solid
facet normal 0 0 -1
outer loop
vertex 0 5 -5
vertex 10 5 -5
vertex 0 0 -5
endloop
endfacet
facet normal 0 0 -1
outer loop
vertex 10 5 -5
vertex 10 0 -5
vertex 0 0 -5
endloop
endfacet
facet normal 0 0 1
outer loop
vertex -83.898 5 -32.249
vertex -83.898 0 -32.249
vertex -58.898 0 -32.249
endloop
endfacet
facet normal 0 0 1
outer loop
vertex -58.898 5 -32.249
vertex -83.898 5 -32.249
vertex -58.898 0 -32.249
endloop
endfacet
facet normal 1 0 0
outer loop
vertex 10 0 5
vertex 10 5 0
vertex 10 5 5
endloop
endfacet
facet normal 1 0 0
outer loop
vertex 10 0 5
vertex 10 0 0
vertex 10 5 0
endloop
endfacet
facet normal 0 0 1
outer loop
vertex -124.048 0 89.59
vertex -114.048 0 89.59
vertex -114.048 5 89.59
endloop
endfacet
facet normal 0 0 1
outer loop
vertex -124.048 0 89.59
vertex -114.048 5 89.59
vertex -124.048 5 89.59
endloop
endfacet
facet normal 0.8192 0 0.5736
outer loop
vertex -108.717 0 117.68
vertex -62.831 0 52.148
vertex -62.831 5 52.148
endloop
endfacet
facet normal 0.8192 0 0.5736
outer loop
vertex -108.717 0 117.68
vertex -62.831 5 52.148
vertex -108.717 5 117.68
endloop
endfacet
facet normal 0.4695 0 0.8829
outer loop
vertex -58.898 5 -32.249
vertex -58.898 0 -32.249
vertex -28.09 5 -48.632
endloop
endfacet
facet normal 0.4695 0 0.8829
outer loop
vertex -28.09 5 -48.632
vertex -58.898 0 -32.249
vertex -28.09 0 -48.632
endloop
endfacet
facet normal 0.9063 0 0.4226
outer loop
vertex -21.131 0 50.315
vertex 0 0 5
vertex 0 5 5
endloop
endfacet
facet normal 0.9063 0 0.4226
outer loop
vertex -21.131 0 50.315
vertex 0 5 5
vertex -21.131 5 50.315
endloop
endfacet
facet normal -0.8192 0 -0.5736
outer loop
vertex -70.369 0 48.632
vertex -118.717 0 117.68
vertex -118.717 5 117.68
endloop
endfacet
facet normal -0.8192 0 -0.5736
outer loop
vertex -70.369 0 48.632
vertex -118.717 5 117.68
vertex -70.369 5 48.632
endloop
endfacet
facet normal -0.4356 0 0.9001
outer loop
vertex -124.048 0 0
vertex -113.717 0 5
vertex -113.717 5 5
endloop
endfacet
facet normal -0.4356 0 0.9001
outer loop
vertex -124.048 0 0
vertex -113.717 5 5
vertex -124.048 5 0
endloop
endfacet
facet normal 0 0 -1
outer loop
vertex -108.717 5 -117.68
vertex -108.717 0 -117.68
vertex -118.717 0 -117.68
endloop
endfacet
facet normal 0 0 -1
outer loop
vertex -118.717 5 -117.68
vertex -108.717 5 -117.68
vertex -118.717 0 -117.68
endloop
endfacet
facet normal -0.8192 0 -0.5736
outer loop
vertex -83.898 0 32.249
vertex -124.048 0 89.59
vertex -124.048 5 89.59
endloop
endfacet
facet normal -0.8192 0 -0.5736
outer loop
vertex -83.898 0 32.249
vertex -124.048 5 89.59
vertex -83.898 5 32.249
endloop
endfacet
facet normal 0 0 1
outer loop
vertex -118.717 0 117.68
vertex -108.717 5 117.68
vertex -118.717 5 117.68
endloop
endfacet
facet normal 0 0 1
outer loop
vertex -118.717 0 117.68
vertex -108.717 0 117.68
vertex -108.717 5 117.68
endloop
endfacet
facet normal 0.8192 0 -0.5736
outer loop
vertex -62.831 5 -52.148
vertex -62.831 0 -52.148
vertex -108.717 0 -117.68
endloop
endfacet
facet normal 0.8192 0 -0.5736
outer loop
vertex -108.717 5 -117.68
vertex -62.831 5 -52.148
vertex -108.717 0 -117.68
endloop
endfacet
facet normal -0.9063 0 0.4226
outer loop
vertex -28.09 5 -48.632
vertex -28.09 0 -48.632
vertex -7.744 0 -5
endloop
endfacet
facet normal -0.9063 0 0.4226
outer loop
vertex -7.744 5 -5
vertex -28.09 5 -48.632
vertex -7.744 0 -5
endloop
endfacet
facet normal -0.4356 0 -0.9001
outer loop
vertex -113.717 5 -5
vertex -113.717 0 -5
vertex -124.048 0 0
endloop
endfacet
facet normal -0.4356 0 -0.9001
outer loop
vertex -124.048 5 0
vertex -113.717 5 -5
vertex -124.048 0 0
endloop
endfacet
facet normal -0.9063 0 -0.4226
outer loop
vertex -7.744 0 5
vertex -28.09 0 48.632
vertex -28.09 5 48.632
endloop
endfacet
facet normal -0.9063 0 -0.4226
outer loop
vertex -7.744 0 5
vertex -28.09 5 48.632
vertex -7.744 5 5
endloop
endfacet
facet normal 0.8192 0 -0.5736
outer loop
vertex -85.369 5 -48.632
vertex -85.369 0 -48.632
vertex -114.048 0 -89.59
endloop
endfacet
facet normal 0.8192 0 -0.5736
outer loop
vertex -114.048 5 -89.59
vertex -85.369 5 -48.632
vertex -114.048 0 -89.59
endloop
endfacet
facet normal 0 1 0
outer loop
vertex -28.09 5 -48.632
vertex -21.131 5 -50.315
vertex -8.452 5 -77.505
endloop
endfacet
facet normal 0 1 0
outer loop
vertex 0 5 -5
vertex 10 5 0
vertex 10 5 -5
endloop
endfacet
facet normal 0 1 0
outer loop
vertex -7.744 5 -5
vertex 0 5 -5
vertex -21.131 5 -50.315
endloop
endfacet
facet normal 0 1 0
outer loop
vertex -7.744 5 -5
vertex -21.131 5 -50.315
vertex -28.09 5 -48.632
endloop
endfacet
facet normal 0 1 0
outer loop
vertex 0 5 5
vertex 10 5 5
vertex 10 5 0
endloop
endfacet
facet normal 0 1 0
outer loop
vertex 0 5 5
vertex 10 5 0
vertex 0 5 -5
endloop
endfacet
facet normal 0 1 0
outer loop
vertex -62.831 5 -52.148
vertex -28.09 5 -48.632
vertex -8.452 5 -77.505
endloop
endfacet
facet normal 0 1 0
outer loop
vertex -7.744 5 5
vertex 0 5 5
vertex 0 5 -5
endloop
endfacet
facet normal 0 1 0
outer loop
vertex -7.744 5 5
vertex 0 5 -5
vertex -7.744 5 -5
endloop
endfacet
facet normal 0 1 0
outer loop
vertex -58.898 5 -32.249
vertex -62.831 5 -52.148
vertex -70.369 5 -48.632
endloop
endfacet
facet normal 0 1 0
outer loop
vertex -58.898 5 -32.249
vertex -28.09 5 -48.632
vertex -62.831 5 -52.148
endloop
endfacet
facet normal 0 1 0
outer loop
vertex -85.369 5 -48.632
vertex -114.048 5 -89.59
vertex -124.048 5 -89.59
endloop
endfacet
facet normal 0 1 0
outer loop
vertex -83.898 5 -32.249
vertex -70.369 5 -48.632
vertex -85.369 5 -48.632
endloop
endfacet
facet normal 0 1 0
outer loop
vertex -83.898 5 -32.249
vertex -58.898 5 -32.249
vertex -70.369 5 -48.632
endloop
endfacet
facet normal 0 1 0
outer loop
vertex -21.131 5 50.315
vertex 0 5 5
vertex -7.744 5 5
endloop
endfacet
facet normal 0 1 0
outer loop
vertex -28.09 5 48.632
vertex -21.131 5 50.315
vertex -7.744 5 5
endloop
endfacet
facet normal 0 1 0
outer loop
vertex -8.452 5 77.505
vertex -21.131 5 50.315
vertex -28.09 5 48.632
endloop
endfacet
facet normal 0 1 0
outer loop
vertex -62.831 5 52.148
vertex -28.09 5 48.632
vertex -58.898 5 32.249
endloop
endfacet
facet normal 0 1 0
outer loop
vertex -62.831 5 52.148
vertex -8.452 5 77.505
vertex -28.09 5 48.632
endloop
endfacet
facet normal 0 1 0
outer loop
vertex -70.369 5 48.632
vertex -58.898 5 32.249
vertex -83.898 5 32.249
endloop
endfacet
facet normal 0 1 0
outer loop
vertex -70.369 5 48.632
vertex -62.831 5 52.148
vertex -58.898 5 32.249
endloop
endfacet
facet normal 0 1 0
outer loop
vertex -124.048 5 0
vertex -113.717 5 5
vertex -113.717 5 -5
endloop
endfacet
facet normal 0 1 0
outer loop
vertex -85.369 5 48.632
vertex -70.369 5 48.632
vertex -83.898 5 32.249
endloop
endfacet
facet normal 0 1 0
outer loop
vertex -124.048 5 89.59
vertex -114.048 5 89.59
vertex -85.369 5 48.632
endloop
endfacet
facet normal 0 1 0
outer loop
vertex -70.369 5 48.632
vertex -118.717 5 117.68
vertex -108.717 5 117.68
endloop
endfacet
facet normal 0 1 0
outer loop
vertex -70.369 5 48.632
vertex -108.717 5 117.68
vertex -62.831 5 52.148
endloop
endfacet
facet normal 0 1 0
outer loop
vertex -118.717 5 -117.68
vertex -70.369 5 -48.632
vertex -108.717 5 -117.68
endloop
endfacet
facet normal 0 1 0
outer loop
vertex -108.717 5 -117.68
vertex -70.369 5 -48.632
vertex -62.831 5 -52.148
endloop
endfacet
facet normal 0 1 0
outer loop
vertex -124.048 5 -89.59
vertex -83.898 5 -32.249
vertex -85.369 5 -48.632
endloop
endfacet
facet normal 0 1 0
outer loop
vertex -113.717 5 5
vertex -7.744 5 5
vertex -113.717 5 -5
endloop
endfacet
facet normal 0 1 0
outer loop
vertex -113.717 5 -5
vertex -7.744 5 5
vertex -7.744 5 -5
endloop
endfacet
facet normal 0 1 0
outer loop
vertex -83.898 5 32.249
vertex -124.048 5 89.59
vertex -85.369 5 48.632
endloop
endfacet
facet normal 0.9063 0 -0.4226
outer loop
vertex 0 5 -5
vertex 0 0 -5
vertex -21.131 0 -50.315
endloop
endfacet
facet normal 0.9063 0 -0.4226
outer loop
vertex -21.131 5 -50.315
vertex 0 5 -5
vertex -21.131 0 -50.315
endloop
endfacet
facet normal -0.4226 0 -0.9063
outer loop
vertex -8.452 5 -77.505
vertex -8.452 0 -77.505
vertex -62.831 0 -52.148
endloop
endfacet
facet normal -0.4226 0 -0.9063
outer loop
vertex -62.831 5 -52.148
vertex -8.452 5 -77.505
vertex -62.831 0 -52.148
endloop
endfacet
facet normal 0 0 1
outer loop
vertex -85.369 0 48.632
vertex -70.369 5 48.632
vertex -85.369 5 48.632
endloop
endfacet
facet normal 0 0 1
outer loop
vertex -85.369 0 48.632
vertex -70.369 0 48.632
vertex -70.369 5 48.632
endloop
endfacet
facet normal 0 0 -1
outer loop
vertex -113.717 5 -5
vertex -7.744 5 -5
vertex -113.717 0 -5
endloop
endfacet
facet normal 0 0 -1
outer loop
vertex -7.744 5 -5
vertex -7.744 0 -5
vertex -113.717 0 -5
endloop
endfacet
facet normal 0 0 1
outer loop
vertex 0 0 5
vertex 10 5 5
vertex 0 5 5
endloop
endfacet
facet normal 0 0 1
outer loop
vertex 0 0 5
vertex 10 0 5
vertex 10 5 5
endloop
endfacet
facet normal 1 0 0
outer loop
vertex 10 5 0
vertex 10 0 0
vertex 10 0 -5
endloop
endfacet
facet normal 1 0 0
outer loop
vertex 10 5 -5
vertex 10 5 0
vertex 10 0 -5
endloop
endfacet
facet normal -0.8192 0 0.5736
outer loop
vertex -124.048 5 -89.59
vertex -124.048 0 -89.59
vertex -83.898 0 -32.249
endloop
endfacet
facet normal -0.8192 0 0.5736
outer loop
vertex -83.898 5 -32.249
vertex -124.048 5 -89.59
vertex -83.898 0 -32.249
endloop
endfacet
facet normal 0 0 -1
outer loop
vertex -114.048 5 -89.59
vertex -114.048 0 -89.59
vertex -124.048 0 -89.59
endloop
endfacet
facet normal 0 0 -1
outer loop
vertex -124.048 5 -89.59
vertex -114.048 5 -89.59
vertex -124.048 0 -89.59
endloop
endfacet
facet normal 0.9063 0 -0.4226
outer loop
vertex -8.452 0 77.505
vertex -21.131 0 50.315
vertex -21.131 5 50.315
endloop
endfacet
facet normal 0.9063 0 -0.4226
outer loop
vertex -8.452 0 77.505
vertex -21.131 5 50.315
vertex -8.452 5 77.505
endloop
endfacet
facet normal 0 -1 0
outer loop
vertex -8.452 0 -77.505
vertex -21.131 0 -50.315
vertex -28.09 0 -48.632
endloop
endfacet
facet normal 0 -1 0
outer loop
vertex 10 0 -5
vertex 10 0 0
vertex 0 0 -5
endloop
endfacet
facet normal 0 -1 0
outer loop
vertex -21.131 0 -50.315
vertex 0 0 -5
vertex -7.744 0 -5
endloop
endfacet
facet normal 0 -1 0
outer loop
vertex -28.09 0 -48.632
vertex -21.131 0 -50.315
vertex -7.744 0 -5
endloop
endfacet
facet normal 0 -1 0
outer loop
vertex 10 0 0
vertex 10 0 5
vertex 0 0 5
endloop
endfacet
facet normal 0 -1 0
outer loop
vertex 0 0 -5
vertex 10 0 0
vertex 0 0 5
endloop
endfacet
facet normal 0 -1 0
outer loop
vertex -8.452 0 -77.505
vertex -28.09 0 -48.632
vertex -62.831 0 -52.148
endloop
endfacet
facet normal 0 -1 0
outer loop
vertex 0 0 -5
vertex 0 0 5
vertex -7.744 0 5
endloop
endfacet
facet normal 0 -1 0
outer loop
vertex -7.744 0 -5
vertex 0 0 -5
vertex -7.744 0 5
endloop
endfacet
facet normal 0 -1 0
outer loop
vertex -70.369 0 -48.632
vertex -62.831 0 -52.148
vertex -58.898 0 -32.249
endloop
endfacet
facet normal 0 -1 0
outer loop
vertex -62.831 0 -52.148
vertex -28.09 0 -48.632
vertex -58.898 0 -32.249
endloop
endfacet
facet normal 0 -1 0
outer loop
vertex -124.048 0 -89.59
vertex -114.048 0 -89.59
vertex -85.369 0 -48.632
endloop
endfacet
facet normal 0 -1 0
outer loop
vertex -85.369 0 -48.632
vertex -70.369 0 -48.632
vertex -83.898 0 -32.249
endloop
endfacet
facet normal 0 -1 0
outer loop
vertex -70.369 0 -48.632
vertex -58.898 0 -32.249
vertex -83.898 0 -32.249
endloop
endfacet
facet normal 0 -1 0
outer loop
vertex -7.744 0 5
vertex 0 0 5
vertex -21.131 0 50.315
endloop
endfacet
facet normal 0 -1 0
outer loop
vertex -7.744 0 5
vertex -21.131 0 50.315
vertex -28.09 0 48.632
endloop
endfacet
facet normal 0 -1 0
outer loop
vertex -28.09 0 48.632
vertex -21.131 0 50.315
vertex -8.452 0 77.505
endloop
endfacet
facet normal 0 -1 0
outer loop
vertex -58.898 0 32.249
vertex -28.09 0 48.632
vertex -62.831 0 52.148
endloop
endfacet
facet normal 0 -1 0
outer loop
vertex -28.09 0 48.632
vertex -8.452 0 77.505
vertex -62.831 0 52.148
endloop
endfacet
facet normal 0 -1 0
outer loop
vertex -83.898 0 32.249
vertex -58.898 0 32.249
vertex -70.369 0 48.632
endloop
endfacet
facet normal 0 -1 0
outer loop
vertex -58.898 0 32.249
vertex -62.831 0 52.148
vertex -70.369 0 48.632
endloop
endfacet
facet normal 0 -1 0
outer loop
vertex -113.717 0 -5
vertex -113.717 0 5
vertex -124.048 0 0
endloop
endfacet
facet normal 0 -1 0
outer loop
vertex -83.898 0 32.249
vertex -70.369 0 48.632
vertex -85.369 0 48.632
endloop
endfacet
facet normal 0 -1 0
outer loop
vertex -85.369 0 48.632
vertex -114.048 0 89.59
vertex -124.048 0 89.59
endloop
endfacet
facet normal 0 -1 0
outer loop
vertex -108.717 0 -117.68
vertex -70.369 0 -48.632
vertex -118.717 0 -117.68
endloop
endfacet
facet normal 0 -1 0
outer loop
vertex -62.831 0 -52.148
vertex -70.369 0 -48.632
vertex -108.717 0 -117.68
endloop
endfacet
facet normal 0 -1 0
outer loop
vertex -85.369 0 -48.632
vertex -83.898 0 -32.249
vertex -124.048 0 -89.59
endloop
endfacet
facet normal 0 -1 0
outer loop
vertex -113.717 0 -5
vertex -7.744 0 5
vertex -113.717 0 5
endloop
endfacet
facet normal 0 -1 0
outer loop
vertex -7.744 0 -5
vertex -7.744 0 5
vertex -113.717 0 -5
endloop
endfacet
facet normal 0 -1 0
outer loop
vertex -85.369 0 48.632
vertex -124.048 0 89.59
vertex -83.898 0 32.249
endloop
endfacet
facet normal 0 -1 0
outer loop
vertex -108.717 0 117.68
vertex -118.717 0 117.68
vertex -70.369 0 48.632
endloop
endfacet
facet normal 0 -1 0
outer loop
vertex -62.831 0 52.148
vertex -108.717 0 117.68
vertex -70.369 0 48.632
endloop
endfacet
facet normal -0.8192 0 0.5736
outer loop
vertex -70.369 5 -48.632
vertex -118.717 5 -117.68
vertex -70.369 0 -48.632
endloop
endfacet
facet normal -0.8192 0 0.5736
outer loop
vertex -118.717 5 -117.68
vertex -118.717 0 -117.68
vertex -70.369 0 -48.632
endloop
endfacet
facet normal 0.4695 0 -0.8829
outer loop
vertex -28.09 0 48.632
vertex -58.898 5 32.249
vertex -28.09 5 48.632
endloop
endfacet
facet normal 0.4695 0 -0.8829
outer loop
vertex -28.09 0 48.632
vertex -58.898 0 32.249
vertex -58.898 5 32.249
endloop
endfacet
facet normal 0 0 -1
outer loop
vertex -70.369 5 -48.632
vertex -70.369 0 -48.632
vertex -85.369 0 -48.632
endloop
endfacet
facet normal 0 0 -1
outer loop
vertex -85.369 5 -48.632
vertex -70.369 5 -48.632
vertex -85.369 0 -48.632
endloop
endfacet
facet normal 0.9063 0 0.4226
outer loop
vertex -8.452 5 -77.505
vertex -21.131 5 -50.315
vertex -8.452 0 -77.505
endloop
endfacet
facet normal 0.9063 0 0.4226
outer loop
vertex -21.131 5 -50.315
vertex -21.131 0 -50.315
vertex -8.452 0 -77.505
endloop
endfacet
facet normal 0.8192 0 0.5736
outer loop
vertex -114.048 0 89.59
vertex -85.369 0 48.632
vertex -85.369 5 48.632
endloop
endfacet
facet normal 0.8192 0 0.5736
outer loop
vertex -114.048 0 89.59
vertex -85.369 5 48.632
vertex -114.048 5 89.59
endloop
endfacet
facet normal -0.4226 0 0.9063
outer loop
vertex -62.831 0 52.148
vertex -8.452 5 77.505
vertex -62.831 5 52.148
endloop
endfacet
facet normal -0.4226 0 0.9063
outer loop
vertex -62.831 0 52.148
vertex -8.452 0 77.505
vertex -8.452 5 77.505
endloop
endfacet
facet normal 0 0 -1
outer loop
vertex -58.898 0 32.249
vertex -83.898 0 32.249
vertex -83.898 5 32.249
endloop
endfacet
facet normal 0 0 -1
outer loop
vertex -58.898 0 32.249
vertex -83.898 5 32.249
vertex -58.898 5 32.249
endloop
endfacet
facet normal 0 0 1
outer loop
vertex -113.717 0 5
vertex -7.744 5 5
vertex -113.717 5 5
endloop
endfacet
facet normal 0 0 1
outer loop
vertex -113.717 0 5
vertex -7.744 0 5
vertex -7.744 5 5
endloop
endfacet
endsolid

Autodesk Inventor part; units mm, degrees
ref_plane "YZ Plane" through (0, 0, 0) normal (1, 0, 0) x (0, 1, 0)
ref_plane "XZ Plane" through (0, 0, 0) normal (0, 1, 0) x (-1, 0, 0)
ref_plane "XY Plane" through (0, 0, 0) normal (0, 0, 1) x (1, 0, 0)
sketch "Sketch1" plane through (0, 0, 0) normal (0, 1, 0) x (-1, 0, 0)
  line L0 (0, 0) -> (10, 0) construction
  line L1 (-10, 0) -> (-10, 5)
  line L2 (-10, 5) -> (0, 5)
  line L3 (-10, 0) -> (-10, -5)
  line L4 (-10, 0) -> (-5, 0) construction
  line L5 (-10, -5) -> (0, -5)
  line L6 (0, -5) -> (21.1309, -50.3154)
  line L7 (21.1309, -50.3154) -> (8.4524, -77.5046)
  line L8 (8.4524, -77.5046) -> (62.8308, -52.1475)
  line L9 (62.8308, -52.1475) -> (108.7169, -117.6797)
  line L10 (108.7169, -117.6797) -> (118.7169, -117.6797)
  line L11 (118.7169, -117.6797) -> (70.3694, -48.6322)
  line L12 (70.3694, -48.6322) -> (85.3694, -48.6322)
  line L13 (85.3694, -48.6322) -> (114.0482, -89.5898)
  line L14 (114.0482, -89.5898) -> (124.0482, -89.5898)
  line L15 (124.0482, -89.5898) -> (83.8979, -32.2492)
  line L16 (83.8979, -32.2492) -> (58.8979, -32.2492)
  line L17 (58.8979, -32.2492) -> (28.0903, -48.6322)
  line L18 (28.0903, -48.6322) -> (7.7442, -5)
  line L19 (7.7442, -5) -> (113.7169, -5)
  line L20 (113.7169, -5) -> (124.0482, 0)
  line L21 (-10, 0) -> (-10, 5)
  line L22 (-10, 5) -> (0, 5)
  line L23 (0, 5) -> (21.1309, 50.3154)
  line L24 (21.1309, 50.3154) -> (8.4524, 77.5046)
  line L25 (8.4524, 77.5046) -> (62.8308, 52.1475)
  line L26 (62.8308, 52.1475) -> (108.7169, 117.6797)
  line L27 (108.7169, 117.6797) -> (118.7169, 117.6797)
  line L28 (118.7169, 117.6797) -> (70.3694, 48.6322)
  line L29 (70.3694, 48.6322) -> (85.3694, 48.6322)
  line L30 (85.3694, 48.6322) -> (114.0482, 89.5898)
  line L31 (114.0482, 89.5898) -> (124.0482, 89.5898)
  line L32 (124.0482, 89.5898) -> (83.8979, 32.2492)
  line L33 (83.8979, 32.2492) -> (58.8979, 32.2492)
  line L34 (58.8979, 32.2492) -> (28.0903, 48.6322)
  line L35 (28.0903, 48.6322) -> (7.7442, 5)
  line L36 (7.7442, 5) -> (113.7169, 5)
  line L37 (113.7169, 5) -> (124.0482, 0)
  dimension "d2" = 5
  dimension "d4" = 10
  dimension "d6" = 5
  dimension "d7" = 90
  dimension "d8" = 10
  dimension "d9" = 90
  dimension "d10" = 50
  dimension "d12" = 30
  dimension "d13" = 130
  dimension "d14" = 60
  dimension "d15" = 80
  dimension "d16" = 100
  dimension "d17" = 10
  dimension "d18" = 125
  dimension "d19" = 15
  dimension "d20" = 55
  dimension "d21" = 50
  dimension "d22" = 125
  dimension "d23" = 10
  dimension "d24" = 125
  dimension "d25" = 70
  dimension "d26" = 55
extrude "Extrusion1" add sketch "Sketch1" along normal blind 5
properties part number "QQI"
